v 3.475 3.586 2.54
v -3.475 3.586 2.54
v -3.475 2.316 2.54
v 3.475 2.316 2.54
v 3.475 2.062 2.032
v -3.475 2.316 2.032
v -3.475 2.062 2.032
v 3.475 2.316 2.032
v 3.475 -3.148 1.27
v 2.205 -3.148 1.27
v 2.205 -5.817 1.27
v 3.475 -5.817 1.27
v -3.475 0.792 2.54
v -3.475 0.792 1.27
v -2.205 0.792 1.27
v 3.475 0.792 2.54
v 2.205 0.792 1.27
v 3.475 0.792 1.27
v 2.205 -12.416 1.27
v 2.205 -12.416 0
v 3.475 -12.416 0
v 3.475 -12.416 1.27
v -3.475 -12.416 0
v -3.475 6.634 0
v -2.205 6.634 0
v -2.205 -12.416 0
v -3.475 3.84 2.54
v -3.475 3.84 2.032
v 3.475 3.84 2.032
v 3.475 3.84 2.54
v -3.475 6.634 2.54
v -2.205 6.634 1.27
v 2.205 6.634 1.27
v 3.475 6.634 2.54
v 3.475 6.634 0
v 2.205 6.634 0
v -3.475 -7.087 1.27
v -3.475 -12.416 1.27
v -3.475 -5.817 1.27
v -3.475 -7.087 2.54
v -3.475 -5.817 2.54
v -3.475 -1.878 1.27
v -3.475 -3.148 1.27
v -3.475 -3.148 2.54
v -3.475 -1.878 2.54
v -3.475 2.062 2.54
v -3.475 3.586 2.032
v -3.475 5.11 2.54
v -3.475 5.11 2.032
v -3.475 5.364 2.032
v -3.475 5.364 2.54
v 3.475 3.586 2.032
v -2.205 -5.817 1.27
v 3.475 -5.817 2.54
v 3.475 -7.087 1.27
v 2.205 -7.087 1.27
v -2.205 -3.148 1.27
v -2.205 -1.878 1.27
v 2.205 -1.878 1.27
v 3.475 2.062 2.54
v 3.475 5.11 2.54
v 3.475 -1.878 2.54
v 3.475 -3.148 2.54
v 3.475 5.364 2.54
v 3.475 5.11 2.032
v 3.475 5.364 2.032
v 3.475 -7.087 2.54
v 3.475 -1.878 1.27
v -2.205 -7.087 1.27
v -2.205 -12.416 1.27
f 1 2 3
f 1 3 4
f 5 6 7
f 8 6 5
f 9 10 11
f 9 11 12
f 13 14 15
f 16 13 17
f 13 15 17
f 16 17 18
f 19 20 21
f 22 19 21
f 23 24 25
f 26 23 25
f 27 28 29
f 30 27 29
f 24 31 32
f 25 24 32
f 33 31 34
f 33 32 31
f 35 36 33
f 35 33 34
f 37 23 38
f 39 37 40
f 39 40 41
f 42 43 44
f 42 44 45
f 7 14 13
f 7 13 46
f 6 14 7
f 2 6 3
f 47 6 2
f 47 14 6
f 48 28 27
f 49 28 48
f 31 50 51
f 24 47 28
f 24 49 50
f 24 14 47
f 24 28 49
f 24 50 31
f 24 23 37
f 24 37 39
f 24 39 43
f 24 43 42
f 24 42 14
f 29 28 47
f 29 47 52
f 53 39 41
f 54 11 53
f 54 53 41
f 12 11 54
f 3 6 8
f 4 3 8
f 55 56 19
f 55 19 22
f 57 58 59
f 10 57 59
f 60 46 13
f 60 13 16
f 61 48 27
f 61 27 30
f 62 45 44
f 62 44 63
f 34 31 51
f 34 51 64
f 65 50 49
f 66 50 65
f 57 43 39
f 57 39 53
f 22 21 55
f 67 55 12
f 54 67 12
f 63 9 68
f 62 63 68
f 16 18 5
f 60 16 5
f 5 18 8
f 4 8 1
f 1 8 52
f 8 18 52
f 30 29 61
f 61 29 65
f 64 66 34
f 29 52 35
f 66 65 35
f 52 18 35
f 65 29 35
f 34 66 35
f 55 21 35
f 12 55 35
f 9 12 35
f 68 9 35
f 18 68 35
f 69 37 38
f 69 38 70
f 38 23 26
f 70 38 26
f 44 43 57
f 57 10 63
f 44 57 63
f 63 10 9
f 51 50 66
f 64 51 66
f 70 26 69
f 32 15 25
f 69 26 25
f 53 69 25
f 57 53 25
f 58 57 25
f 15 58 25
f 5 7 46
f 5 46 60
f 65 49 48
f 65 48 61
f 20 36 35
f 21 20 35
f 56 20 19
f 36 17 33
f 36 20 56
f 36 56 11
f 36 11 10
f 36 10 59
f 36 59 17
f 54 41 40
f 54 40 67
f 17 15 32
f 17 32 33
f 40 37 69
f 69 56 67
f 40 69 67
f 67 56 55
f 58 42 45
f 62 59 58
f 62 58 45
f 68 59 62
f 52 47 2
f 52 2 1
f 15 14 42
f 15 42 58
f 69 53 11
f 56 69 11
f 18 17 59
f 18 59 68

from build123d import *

# Parameters (mm, degrees)
F0_W     = 1.27
F0_H     = 19.05
F1_DEPTH = 1.27
F2_W     = 6.94944
F2_H     = 1.27
F3_DEPTH = 1.27
F4_W     = 6.94944
F4_H     = 5.842
F5_DEPTH = 0.762


with BuildPart() as f1:
    # F0 (on Top) → F1 (new body)
    with BuildSketch(Plane.XY):
        with Locations((-2.83972, -2.891212)):
            Rectangle(F0_W, F0_H)
        with Locations((2.83972, -2.891212)):
            Rectangle(F0_W, F0_H)
    extrude(amount=F1_DEPTH)

    # F2 (on face) → F3 (join)
    with BuildSketch(Plane.XY.offset(1.27)):
        with Locations((0, 5.998788)):
            Rectangle(F2_W, F2_H)
        with Locations((0, 4.474788)):
            Rectangle(F2_W, F2_H)
        with Locations((0, 2.950788)):
            Rectangle(F2_W, F2_H)
        with Locations((0, 1.426788)):
            Rectangle(F2_W, F2_H)
        with Locations((0, -2.51257)):
            Rectangle(F2_W, F2_H)
        with Locations((0, -6.451929)):
            Rectangle(F2_W, F2_H)
    extrude(amount=F3_DEPTH)

    # F4 (on face) → F5 (join)
    with BuildSketch(Plane.XY.offset(1.27)):
        with Locations((0, 3.712788)):
            Rectangle(F4_W, F4_H)
    extrude(amount=F5_DEPTH)


solid = f1.part
